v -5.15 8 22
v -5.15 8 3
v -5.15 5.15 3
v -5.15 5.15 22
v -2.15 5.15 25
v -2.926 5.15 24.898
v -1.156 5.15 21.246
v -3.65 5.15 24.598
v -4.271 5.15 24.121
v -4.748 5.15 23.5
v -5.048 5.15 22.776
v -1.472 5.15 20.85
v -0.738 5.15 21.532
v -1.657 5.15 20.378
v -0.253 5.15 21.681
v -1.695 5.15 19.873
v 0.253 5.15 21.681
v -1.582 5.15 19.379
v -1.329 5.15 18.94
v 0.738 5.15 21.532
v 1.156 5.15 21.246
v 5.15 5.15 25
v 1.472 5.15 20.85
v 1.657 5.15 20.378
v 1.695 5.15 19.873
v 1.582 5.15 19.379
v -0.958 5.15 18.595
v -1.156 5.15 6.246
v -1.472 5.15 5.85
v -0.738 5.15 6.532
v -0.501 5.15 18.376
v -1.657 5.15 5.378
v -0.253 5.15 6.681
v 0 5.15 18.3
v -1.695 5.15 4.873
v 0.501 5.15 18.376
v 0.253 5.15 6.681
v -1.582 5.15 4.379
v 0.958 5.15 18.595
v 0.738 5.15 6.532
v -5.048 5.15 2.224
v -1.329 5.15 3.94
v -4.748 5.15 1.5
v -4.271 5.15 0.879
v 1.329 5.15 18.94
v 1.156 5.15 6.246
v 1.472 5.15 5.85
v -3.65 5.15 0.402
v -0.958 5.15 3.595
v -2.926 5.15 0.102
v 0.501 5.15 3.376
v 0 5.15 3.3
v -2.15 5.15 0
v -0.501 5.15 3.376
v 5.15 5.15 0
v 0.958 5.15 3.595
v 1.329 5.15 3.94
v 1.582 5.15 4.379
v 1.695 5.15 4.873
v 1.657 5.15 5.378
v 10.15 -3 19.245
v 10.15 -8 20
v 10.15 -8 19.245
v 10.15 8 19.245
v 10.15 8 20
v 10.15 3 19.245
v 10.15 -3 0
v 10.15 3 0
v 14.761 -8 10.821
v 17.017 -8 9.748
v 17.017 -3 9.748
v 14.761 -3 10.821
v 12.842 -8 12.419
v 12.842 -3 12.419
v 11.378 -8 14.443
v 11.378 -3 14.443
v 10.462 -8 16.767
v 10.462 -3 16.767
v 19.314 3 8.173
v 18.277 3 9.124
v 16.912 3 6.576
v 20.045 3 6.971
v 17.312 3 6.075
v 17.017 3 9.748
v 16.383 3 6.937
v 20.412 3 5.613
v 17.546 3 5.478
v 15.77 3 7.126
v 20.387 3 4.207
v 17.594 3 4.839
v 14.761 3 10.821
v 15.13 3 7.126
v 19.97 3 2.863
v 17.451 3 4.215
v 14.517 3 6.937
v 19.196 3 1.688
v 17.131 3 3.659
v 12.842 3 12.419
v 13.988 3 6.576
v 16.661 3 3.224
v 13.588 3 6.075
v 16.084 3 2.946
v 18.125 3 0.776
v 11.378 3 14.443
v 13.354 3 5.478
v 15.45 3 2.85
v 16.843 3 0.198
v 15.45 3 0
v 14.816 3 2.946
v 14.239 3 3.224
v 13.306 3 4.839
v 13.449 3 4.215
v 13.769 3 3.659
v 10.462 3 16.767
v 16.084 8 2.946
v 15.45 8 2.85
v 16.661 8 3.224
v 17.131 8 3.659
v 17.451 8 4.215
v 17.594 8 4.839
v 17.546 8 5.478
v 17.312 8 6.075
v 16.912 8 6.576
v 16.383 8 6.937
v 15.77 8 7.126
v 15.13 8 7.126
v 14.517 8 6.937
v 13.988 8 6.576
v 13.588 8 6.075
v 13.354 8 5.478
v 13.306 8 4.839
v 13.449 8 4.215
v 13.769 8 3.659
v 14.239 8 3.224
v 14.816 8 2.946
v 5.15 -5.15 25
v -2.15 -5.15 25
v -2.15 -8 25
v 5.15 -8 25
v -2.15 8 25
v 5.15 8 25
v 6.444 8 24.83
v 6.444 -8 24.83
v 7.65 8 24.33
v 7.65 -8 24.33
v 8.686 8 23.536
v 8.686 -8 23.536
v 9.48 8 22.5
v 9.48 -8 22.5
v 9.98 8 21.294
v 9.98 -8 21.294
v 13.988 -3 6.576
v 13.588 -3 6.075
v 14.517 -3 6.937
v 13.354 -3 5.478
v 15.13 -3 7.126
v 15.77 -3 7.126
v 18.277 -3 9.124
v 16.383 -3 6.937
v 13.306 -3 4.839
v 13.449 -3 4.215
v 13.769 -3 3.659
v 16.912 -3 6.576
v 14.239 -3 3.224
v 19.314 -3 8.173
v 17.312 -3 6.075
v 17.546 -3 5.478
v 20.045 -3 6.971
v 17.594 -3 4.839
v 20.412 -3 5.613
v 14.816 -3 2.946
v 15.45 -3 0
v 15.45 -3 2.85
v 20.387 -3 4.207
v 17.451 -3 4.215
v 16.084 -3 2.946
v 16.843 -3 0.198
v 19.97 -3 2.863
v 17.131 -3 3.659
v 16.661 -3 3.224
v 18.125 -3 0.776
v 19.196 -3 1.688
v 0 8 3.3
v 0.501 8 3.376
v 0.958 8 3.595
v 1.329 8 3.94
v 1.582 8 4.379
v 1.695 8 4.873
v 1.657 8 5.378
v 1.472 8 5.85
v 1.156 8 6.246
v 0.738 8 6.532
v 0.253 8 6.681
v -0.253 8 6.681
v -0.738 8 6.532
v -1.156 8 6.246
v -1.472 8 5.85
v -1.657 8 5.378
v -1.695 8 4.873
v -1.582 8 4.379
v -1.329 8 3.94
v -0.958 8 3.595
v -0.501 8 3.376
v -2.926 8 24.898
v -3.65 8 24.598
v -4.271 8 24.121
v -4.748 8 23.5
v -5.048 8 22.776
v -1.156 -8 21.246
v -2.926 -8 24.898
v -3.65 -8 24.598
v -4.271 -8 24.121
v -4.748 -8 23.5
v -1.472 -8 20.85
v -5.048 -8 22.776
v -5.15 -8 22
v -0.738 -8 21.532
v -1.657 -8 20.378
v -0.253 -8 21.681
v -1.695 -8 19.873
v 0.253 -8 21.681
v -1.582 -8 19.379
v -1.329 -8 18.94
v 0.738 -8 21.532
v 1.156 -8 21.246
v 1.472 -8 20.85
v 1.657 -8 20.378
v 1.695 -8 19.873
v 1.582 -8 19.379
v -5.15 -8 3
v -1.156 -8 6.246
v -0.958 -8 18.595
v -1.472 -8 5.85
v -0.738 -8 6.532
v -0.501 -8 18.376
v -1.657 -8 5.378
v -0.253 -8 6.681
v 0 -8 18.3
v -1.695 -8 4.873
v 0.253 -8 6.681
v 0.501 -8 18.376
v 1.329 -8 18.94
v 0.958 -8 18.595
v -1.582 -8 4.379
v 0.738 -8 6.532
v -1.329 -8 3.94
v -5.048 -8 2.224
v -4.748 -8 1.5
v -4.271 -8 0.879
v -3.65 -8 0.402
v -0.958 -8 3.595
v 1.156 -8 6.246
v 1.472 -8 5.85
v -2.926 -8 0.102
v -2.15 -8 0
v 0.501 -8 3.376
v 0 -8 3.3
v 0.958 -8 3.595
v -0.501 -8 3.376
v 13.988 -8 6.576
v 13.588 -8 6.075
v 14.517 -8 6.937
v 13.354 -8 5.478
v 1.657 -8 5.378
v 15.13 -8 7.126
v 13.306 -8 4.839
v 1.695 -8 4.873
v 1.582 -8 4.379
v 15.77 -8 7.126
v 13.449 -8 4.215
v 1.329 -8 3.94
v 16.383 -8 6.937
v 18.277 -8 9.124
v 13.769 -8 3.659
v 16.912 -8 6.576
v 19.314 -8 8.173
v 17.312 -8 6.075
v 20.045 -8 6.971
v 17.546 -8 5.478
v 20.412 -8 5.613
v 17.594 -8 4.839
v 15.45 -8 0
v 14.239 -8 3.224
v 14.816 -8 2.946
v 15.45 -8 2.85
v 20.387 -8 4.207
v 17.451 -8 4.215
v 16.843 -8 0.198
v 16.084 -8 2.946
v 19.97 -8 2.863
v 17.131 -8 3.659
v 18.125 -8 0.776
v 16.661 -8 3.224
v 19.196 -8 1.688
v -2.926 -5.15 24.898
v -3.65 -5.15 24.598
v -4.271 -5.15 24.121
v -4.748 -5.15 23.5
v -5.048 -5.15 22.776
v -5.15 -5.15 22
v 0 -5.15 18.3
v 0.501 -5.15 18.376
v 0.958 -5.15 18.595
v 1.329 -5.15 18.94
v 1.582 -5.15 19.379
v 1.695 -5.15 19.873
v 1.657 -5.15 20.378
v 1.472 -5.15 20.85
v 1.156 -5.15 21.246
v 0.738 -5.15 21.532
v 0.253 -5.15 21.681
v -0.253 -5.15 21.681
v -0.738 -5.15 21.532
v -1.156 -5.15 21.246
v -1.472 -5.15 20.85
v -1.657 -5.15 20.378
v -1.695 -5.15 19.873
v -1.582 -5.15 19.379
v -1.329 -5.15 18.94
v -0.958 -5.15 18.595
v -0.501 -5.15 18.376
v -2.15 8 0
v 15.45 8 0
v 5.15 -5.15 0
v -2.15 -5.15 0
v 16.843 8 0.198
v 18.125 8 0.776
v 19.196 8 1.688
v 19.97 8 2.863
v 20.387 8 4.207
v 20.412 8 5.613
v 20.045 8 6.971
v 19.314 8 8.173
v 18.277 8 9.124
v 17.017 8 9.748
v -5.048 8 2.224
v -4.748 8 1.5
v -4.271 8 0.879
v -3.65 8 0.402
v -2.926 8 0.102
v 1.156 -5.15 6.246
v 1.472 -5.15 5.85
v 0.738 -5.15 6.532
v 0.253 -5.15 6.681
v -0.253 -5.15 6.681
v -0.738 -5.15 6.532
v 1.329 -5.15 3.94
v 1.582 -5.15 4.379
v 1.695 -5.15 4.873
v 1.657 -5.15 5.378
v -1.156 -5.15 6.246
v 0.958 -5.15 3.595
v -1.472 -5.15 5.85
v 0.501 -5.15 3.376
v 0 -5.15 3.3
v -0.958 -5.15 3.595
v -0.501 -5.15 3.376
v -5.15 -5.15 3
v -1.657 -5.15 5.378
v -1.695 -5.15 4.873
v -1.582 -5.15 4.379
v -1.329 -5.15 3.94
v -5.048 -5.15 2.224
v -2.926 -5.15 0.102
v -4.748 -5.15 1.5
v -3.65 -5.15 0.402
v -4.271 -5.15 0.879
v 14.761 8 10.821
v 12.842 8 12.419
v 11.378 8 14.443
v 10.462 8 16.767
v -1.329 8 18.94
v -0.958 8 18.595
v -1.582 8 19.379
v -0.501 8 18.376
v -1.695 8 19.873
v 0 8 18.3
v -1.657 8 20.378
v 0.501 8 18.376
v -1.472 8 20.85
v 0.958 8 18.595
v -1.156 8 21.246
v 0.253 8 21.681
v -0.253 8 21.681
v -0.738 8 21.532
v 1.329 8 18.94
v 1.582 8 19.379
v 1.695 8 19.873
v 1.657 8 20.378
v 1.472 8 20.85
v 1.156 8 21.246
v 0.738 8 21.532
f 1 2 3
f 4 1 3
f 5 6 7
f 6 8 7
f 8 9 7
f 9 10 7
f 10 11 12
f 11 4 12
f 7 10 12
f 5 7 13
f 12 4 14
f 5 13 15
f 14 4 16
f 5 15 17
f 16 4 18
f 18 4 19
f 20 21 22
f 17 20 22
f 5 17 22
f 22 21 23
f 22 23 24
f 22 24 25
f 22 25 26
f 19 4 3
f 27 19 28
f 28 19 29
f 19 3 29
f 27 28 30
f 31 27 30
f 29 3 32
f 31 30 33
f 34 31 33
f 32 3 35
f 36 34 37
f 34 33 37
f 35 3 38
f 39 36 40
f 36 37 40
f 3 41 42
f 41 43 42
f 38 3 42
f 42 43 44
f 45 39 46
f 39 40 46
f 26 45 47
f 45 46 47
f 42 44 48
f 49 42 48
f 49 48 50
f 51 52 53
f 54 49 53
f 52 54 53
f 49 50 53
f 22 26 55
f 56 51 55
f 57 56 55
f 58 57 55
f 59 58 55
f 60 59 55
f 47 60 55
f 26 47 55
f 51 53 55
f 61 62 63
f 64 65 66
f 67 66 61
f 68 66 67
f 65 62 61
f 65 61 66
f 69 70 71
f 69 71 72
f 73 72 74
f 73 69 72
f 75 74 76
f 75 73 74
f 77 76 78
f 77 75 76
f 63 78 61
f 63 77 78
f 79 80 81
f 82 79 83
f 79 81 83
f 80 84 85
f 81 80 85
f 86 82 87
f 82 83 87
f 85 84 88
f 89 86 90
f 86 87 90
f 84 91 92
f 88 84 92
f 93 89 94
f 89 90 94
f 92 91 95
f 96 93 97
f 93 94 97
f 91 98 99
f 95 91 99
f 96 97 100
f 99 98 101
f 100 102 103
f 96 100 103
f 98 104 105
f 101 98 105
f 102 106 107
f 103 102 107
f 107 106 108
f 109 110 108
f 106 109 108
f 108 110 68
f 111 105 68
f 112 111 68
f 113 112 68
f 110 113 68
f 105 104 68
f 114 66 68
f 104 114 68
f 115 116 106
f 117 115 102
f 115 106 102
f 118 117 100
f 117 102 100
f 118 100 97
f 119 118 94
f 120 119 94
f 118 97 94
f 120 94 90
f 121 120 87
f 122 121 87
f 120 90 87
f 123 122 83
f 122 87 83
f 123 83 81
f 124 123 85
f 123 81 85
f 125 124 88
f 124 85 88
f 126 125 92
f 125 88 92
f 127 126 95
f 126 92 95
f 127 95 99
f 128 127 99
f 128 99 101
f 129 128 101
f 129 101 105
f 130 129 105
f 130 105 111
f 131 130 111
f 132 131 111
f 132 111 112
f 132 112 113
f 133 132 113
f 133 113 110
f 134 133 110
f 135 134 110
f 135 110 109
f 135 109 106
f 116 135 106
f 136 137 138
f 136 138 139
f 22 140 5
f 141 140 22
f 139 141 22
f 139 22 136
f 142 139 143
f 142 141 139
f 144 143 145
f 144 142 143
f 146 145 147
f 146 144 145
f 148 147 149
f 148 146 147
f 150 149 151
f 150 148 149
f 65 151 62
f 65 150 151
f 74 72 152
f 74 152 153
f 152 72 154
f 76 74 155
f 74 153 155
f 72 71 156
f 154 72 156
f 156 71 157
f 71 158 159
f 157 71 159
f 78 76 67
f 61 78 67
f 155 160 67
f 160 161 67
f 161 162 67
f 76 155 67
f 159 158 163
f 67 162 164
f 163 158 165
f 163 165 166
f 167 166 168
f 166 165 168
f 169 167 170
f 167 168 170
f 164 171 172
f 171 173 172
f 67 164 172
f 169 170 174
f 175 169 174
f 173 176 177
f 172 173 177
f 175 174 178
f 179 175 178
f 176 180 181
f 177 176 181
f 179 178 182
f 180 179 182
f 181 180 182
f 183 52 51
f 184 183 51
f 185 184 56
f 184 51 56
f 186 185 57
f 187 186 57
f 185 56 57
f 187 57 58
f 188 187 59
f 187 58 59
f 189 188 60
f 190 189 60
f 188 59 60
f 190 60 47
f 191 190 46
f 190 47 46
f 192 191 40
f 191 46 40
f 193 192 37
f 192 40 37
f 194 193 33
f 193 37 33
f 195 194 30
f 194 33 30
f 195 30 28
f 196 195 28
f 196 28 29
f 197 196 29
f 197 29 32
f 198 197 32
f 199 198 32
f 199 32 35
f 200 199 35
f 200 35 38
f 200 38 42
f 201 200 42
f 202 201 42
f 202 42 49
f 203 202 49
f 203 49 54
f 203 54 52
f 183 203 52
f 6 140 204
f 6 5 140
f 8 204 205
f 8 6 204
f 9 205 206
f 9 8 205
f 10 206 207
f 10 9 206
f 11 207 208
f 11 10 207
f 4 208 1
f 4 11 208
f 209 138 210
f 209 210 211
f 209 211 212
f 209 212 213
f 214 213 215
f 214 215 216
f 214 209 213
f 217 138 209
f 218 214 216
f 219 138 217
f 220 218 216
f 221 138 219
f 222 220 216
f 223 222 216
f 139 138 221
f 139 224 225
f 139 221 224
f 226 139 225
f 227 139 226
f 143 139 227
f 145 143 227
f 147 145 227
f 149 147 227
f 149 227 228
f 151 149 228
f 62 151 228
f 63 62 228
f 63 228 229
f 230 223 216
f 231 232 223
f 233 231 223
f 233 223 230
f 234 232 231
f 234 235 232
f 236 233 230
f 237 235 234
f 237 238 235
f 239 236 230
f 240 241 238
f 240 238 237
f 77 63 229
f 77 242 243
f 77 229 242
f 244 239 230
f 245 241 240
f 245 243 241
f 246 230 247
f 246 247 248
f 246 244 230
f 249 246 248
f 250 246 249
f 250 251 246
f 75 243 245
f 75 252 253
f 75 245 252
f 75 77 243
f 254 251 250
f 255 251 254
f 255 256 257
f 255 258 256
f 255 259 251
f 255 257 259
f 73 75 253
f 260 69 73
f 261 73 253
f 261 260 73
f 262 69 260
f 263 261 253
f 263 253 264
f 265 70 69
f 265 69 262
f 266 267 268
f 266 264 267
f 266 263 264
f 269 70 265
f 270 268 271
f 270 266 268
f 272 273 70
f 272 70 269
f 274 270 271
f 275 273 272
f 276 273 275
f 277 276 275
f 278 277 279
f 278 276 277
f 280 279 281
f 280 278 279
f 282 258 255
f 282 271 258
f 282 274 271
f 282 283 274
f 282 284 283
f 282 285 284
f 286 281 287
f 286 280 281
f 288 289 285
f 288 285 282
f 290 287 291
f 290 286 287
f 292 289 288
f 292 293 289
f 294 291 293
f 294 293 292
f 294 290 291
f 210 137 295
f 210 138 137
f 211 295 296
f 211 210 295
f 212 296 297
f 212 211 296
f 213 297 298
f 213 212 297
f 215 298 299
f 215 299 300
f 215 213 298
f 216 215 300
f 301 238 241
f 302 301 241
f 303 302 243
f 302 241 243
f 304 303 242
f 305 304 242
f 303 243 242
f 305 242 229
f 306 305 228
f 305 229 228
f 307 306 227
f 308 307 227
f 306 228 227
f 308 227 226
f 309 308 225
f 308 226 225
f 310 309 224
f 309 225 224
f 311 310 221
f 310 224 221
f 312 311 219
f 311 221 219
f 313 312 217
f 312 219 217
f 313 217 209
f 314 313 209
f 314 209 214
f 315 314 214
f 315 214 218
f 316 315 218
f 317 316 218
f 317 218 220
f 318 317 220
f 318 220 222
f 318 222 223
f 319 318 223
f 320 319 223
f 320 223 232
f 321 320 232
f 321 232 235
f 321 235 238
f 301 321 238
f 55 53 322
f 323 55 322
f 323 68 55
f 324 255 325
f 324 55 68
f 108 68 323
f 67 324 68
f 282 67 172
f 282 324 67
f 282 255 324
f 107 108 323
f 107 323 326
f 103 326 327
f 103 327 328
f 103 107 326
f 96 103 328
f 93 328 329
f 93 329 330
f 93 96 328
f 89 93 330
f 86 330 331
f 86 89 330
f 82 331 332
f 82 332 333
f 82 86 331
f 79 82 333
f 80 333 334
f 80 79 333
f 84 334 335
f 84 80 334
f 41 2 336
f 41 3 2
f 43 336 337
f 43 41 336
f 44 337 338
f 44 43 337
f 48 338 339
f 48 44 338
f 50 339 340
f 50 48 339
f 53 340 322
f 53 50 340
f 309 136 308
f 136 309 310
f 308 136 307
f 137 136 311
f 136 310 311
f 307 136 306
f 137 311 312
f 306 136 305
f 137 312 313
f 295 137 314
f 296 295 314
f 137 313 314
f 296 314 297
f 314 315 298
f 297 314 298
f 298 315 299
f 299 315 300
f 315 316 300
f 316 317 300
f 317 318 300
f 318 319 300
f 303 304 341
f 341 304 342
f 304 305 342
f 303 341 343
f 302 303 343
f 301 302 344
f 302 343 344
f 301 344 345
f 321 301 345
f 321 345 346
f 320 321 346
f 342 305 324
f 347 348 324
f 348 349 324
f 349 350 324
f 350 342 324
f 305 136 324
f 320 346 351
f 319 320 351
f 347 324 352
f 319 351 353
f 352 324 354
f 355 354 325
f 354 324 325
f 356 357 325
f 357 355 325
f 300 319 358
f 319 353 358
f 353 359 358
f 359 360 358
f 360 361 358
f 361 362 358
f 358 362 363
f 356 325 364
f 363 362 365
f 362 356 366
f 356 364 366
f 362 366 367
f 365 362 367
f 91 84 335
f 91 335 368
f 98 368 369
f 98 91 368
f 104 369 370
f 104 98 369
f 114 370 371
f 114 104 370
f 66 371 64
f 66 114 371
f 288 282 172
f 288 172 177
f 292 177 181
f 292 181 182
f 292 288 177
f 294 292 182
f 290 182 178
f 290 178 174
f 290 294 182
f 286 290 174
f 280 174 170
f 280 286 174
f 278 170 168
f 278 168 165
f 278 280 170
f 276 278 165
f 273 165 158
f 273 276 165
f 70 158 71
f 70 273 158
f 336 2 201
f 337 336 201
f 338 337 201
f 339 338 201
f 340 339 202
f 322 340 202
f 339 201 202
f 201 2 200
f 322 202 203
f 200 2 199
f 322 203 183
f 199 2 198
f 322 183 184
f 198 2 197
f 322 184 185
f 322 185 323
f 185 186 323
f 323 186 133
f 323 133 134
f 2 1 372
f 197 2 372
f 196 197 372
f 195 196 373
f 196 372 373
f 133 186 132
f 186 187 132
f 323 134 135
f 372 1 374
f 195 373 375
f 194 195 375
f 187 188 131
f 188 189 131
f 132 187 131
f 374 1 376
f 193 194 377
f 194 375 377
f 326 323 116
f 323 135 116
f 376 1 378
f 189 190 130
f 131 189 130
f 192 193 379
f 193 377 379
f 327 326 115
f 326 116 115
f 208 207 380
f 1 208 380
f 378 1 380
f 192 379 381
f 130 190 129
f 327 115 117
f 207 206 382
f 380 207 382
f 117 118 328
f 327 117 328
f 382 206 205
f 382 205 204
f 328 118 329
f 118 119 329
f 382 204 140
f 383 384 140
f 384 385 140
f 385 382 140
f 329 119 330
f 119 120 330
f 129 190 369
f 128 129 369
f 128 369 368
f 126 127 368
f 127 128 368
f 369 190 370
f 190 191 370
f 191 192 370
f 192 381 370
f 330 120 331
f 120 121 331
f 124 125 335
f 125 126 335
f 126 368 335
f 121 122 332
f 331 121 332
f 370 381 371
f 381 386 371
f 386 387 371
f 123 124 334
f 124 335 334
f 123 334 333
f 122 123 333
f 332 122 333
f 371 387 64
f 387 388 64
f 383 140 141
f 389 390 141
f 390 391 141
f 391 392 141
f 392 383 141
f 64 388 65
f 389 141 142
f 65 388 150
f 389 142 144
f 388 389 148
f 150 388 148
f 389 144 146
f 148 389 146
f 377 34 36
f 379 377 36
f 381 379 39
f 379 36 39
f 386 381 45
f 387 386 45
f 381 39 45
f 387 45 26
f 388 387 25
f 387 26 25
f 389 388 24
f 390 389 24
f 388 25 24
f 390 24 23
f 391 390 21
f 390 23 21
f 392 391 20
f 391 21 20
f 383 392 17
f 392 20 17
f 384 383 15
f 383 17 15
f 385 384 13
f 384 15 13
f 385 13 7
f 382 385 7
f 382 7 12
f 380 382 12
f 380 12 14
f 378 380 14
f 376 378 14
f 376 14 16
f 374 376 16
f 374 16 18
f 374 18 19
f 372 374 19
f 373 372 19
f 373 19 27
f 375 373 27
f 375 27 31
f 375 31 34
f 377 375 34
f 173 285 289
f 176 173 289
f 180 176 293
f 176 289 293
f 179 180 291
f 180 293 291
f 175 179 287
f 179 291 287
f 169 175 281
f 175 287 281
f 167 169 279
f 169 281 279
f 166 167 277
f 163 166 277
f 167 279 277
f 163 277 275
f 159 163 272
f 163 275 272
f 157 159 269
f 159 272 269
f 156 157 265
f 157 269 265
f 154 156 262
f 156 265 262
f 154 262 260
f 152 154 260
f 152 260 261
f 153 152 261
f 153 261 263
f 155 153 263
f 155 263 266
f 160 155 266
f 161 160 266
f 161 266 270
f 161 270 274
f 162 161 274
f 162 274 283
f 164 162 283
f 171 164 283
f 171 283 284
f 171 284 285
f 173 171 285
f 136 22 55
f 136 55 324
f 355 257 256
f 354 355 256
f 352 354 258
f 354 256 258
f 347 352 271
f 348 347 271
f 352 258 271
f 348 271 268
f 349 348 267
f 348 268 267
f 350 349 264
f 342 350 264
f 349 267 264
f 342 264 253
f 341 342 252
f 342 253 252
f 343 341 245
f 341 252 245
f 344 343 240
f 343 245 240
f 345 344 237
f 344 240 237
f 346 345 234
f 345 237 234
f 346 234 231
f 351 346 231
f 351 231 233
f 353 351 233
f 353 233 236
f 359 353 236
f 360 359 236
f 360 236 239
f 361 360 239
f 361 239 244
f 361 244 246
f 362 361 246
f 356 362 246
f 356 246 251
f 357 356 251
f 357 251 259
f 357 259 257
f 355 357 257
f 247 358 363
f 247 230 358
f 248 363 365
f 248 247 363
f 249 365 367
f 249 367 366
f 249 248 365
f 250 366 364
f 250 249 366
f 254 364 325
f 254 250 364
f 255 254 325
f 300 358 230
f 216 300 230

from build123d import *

# Parameters (mm, degrees)
EXTRUDE_1_DEPTH     = 25
SKETCH_2_R          = 1.7
CUT_EXTRUDE_1_DEPTH = 32.369132918
SKETCH_3_R          = 2.15
EXTRUDE_2_DEPTH     = 16
SKETCH_4_W          = 20
SKETCH_4_H          = 6
CUT_EXTRUDE_2_DEPTH = 31.382396219
FILLET_1_R          = 10
FILLET_2_R          = 5
FILLET_3_R          = 3


# Some blends are built 0.0001 mm under size
with BuildPart() as part:
    # ｽｹｯﾁ1 → ﾎﾞｽ - 押し出し1 (new body)
    with BuildSketch(Plane.XY):
        Polygon((5.15, 0), (10.15, 0), (10.15, 8), (-5.15, 8), (-5.15, 5.15), (5.15, 5.15), align=None)
        Polygon((10.15, -8), (10.15, 0), (5.15, 0), (5.15, -5.15), (-5.15, -5.15), (-5.15, -8), align=None)
    extrude(amount=EXTRUDE_1_DEPTH)

    # ｽｹｯﾁ2 → ｶｯﾄ - 押し出し1 (cut, through all)
    with BuildSketch(Plane.XZ.offset(8)):
        with Locations(Location((0, 20, 0), (0, 0, 270))):
            Circle(SKETCH_2_R)
        with Locations(Location((0, 5, 0), (0, 0, 270))):
            Circle(SKETCH_2_R)
    extrude(amount=-CUT_EXTRUDE_1_DEPTH, mode=Mode.SUBTRACT)

    # ｽｹｯﾁ3 → ﾎﾞｽ - 押し出し2 (add, through all)
    with BuildSketch(Plane.XZ.offset(8)):
        with BuildLine():
            Line((10.15, 0), (15.45, 0))
            ThreePointArc((15.45, 0), (20.45, 5), (15.45, 10))
            Line((15.45, 10), (10.15, 10))
            Line((10.15, 10), (10.15, 0))
        make_face()
        with Locations(Location((15.45, 5, 0), (0, 0, 270))):
            Circle(SKETCH_3_R, mode=Mode.SUBTRACT)
    extrude(amount=-EXTRUDE_2_DEPTH)

    # ｽｹｯﾁ4 → ｶｯﾄ - 押し出し2 (cut, through all)
    with BuildSketch(Plane(origin=(10.15, 0, 0), x_dir=(0, 0, -1), z_dir=(1, 0, 0))):
        Rectangle(SKETCH_4_W, SKETCH_4_H)
    extrude(amount=CUT_EXTRUDE_2_DEPTH, mode=Mode.SUBTRACT)

    # ﾌｨﾚｯﾄ1
    # the kernel refuses this fillet: 10 mm, written as the material it adds along each edge
    with BuildSketch(Plane(origin=(10.15, -8, 10), x_dir=(0, 0, 1), z_dir=(0, 1, 0)), Plane(origin=(10.15, 3, 10), x_dir=(0, 0, 1), z_dir=(0, 1, 0))) as fillet_1_piece_1:
        with BuildLine():
            CenterArc((9.244648118, 10), FILLET_1_R, 198.260227933, 71.739772067)
            Line((-0.251783961, 6.866666667), (-1.201427169, 6.553333333))
            ThreePointArc((-1.201427169, 6.553333333), (-1, 5.3), (-1, 0))
            Line((-1, 0), (0, -1))
            Line((0, -1), (9.244648118, -1))
            Line((9.244648118, -1), (9.244648118, 0))
        make_face()
    extrude(amount=5)
    with BuildSketch(Plane(origin=(10.15, -8, 10), x_dir=(0, 0, 1), z_dir=(0, 1, 0))) as fillet_1_piece_2_section:
        with BuildLine():
            CenterArc((9.244648118, 10), FILLET_1_R, 198.260227933, 71.739772067)
            Line((-0.251783961, 6.866666667), (-1.201427169, 6.553333333))
            ThreePointArc((-1.201427169, 6.553333333), (-1, 5.3), (-1, 0))
            Line((-1, 0), (0, -1))
            Line((0, -1), (9.244648118, -1))
            Line((9.244648118, -1), (9.244648118, 0))
        make_face()
    fillet_1_piece_2 = extrude(amount=28.111620295, mode=Mode.PRIVATE)
    fillet_1_piece_2 = split(fillet_1_piece_2, bisect_by=Plane(origin=(11.517519747, 8, 12.315903655), z_dir=(0, -1, 0)), keep=Keep.TOP, mode=Mode.PRIVATE)
    fillet_1_piece_2 = split(fillet_1_piece_2, bisect_by=Plane(origin=(11.517519747, 3, 12.315903655), z_dir=(0, 1, 0)), keep=Keep.TOP, mode=Mode.PRIVATE)
    add(fillet_1_piece_2)
    with BuildSketch(Plane(origin=(10.15, -20.111620295, 10), x_dir=(0, 0, 1), z_dir=(0, 1, 0))) as fillet_1_piece_3_section:
        with BuildLine():
            CenterArc((9.244648118, 10), FILLET_1_R, 198.260227933, 71.739772067)
            Line((-0.251783961, 6.866666667), (-1.201427169, 6.553333333))
            ThreePointArc((-1.201427169, 6.553333333), (-1, 5.3), (-1, 0))
            Line((-1, 0), (0, -1))
            Line((0, -1), (9.244648118, -1))
            Line((9.244648118, -1), (9.244648118, 0))
        make_face()
    fillet_1_piece_3 = extrude(amount=28.111620295, mode=Mode.PRIVATE)
    fillet_1_piece_3 = split(fillet_1_piece_3, bisect_by=Plane(origin=(11.517519747, -8, 12.315903655), z_dir=(0, 1, 0)), keep=Keep.TOP, mode=Mode.PRIVATE)
    fillet_1_piece_3 = split(fillet_1_piece_3, bisect_by=Plane(origin=(11.517519747, -3, 12.315903655), z_dir=(0, -1, 0)), keep=Keep.TOP, mode=Mode.PRIVATE)
    add(fillet_1_piece_3)

    # ﾌｨﾚｯﾄ2
    fillet_2_edges = [part.edges().sort_by_distance(p)[0] for p in [
        (10.15, 0, 25),
    ]]
    fillet(fillet_2_edges, radius=FILLET_2_R - 0.0001)  # a hair under: the kernel refuses the full size

    # ﾌｨﾚｯﾄ3
    fillet_3_edges = [part.edges().sort_by_distance(p)[0] for p in [
        (-5.15, 6.575, 0),
        (-5.15, -6.575, 0),
        (-5.15, -6.575, 25),
        (-5.15, 6.575, 25),
    ]]
    fillet(fillet_3_edges, radius=FILLET_3_R)


solid = part.part
